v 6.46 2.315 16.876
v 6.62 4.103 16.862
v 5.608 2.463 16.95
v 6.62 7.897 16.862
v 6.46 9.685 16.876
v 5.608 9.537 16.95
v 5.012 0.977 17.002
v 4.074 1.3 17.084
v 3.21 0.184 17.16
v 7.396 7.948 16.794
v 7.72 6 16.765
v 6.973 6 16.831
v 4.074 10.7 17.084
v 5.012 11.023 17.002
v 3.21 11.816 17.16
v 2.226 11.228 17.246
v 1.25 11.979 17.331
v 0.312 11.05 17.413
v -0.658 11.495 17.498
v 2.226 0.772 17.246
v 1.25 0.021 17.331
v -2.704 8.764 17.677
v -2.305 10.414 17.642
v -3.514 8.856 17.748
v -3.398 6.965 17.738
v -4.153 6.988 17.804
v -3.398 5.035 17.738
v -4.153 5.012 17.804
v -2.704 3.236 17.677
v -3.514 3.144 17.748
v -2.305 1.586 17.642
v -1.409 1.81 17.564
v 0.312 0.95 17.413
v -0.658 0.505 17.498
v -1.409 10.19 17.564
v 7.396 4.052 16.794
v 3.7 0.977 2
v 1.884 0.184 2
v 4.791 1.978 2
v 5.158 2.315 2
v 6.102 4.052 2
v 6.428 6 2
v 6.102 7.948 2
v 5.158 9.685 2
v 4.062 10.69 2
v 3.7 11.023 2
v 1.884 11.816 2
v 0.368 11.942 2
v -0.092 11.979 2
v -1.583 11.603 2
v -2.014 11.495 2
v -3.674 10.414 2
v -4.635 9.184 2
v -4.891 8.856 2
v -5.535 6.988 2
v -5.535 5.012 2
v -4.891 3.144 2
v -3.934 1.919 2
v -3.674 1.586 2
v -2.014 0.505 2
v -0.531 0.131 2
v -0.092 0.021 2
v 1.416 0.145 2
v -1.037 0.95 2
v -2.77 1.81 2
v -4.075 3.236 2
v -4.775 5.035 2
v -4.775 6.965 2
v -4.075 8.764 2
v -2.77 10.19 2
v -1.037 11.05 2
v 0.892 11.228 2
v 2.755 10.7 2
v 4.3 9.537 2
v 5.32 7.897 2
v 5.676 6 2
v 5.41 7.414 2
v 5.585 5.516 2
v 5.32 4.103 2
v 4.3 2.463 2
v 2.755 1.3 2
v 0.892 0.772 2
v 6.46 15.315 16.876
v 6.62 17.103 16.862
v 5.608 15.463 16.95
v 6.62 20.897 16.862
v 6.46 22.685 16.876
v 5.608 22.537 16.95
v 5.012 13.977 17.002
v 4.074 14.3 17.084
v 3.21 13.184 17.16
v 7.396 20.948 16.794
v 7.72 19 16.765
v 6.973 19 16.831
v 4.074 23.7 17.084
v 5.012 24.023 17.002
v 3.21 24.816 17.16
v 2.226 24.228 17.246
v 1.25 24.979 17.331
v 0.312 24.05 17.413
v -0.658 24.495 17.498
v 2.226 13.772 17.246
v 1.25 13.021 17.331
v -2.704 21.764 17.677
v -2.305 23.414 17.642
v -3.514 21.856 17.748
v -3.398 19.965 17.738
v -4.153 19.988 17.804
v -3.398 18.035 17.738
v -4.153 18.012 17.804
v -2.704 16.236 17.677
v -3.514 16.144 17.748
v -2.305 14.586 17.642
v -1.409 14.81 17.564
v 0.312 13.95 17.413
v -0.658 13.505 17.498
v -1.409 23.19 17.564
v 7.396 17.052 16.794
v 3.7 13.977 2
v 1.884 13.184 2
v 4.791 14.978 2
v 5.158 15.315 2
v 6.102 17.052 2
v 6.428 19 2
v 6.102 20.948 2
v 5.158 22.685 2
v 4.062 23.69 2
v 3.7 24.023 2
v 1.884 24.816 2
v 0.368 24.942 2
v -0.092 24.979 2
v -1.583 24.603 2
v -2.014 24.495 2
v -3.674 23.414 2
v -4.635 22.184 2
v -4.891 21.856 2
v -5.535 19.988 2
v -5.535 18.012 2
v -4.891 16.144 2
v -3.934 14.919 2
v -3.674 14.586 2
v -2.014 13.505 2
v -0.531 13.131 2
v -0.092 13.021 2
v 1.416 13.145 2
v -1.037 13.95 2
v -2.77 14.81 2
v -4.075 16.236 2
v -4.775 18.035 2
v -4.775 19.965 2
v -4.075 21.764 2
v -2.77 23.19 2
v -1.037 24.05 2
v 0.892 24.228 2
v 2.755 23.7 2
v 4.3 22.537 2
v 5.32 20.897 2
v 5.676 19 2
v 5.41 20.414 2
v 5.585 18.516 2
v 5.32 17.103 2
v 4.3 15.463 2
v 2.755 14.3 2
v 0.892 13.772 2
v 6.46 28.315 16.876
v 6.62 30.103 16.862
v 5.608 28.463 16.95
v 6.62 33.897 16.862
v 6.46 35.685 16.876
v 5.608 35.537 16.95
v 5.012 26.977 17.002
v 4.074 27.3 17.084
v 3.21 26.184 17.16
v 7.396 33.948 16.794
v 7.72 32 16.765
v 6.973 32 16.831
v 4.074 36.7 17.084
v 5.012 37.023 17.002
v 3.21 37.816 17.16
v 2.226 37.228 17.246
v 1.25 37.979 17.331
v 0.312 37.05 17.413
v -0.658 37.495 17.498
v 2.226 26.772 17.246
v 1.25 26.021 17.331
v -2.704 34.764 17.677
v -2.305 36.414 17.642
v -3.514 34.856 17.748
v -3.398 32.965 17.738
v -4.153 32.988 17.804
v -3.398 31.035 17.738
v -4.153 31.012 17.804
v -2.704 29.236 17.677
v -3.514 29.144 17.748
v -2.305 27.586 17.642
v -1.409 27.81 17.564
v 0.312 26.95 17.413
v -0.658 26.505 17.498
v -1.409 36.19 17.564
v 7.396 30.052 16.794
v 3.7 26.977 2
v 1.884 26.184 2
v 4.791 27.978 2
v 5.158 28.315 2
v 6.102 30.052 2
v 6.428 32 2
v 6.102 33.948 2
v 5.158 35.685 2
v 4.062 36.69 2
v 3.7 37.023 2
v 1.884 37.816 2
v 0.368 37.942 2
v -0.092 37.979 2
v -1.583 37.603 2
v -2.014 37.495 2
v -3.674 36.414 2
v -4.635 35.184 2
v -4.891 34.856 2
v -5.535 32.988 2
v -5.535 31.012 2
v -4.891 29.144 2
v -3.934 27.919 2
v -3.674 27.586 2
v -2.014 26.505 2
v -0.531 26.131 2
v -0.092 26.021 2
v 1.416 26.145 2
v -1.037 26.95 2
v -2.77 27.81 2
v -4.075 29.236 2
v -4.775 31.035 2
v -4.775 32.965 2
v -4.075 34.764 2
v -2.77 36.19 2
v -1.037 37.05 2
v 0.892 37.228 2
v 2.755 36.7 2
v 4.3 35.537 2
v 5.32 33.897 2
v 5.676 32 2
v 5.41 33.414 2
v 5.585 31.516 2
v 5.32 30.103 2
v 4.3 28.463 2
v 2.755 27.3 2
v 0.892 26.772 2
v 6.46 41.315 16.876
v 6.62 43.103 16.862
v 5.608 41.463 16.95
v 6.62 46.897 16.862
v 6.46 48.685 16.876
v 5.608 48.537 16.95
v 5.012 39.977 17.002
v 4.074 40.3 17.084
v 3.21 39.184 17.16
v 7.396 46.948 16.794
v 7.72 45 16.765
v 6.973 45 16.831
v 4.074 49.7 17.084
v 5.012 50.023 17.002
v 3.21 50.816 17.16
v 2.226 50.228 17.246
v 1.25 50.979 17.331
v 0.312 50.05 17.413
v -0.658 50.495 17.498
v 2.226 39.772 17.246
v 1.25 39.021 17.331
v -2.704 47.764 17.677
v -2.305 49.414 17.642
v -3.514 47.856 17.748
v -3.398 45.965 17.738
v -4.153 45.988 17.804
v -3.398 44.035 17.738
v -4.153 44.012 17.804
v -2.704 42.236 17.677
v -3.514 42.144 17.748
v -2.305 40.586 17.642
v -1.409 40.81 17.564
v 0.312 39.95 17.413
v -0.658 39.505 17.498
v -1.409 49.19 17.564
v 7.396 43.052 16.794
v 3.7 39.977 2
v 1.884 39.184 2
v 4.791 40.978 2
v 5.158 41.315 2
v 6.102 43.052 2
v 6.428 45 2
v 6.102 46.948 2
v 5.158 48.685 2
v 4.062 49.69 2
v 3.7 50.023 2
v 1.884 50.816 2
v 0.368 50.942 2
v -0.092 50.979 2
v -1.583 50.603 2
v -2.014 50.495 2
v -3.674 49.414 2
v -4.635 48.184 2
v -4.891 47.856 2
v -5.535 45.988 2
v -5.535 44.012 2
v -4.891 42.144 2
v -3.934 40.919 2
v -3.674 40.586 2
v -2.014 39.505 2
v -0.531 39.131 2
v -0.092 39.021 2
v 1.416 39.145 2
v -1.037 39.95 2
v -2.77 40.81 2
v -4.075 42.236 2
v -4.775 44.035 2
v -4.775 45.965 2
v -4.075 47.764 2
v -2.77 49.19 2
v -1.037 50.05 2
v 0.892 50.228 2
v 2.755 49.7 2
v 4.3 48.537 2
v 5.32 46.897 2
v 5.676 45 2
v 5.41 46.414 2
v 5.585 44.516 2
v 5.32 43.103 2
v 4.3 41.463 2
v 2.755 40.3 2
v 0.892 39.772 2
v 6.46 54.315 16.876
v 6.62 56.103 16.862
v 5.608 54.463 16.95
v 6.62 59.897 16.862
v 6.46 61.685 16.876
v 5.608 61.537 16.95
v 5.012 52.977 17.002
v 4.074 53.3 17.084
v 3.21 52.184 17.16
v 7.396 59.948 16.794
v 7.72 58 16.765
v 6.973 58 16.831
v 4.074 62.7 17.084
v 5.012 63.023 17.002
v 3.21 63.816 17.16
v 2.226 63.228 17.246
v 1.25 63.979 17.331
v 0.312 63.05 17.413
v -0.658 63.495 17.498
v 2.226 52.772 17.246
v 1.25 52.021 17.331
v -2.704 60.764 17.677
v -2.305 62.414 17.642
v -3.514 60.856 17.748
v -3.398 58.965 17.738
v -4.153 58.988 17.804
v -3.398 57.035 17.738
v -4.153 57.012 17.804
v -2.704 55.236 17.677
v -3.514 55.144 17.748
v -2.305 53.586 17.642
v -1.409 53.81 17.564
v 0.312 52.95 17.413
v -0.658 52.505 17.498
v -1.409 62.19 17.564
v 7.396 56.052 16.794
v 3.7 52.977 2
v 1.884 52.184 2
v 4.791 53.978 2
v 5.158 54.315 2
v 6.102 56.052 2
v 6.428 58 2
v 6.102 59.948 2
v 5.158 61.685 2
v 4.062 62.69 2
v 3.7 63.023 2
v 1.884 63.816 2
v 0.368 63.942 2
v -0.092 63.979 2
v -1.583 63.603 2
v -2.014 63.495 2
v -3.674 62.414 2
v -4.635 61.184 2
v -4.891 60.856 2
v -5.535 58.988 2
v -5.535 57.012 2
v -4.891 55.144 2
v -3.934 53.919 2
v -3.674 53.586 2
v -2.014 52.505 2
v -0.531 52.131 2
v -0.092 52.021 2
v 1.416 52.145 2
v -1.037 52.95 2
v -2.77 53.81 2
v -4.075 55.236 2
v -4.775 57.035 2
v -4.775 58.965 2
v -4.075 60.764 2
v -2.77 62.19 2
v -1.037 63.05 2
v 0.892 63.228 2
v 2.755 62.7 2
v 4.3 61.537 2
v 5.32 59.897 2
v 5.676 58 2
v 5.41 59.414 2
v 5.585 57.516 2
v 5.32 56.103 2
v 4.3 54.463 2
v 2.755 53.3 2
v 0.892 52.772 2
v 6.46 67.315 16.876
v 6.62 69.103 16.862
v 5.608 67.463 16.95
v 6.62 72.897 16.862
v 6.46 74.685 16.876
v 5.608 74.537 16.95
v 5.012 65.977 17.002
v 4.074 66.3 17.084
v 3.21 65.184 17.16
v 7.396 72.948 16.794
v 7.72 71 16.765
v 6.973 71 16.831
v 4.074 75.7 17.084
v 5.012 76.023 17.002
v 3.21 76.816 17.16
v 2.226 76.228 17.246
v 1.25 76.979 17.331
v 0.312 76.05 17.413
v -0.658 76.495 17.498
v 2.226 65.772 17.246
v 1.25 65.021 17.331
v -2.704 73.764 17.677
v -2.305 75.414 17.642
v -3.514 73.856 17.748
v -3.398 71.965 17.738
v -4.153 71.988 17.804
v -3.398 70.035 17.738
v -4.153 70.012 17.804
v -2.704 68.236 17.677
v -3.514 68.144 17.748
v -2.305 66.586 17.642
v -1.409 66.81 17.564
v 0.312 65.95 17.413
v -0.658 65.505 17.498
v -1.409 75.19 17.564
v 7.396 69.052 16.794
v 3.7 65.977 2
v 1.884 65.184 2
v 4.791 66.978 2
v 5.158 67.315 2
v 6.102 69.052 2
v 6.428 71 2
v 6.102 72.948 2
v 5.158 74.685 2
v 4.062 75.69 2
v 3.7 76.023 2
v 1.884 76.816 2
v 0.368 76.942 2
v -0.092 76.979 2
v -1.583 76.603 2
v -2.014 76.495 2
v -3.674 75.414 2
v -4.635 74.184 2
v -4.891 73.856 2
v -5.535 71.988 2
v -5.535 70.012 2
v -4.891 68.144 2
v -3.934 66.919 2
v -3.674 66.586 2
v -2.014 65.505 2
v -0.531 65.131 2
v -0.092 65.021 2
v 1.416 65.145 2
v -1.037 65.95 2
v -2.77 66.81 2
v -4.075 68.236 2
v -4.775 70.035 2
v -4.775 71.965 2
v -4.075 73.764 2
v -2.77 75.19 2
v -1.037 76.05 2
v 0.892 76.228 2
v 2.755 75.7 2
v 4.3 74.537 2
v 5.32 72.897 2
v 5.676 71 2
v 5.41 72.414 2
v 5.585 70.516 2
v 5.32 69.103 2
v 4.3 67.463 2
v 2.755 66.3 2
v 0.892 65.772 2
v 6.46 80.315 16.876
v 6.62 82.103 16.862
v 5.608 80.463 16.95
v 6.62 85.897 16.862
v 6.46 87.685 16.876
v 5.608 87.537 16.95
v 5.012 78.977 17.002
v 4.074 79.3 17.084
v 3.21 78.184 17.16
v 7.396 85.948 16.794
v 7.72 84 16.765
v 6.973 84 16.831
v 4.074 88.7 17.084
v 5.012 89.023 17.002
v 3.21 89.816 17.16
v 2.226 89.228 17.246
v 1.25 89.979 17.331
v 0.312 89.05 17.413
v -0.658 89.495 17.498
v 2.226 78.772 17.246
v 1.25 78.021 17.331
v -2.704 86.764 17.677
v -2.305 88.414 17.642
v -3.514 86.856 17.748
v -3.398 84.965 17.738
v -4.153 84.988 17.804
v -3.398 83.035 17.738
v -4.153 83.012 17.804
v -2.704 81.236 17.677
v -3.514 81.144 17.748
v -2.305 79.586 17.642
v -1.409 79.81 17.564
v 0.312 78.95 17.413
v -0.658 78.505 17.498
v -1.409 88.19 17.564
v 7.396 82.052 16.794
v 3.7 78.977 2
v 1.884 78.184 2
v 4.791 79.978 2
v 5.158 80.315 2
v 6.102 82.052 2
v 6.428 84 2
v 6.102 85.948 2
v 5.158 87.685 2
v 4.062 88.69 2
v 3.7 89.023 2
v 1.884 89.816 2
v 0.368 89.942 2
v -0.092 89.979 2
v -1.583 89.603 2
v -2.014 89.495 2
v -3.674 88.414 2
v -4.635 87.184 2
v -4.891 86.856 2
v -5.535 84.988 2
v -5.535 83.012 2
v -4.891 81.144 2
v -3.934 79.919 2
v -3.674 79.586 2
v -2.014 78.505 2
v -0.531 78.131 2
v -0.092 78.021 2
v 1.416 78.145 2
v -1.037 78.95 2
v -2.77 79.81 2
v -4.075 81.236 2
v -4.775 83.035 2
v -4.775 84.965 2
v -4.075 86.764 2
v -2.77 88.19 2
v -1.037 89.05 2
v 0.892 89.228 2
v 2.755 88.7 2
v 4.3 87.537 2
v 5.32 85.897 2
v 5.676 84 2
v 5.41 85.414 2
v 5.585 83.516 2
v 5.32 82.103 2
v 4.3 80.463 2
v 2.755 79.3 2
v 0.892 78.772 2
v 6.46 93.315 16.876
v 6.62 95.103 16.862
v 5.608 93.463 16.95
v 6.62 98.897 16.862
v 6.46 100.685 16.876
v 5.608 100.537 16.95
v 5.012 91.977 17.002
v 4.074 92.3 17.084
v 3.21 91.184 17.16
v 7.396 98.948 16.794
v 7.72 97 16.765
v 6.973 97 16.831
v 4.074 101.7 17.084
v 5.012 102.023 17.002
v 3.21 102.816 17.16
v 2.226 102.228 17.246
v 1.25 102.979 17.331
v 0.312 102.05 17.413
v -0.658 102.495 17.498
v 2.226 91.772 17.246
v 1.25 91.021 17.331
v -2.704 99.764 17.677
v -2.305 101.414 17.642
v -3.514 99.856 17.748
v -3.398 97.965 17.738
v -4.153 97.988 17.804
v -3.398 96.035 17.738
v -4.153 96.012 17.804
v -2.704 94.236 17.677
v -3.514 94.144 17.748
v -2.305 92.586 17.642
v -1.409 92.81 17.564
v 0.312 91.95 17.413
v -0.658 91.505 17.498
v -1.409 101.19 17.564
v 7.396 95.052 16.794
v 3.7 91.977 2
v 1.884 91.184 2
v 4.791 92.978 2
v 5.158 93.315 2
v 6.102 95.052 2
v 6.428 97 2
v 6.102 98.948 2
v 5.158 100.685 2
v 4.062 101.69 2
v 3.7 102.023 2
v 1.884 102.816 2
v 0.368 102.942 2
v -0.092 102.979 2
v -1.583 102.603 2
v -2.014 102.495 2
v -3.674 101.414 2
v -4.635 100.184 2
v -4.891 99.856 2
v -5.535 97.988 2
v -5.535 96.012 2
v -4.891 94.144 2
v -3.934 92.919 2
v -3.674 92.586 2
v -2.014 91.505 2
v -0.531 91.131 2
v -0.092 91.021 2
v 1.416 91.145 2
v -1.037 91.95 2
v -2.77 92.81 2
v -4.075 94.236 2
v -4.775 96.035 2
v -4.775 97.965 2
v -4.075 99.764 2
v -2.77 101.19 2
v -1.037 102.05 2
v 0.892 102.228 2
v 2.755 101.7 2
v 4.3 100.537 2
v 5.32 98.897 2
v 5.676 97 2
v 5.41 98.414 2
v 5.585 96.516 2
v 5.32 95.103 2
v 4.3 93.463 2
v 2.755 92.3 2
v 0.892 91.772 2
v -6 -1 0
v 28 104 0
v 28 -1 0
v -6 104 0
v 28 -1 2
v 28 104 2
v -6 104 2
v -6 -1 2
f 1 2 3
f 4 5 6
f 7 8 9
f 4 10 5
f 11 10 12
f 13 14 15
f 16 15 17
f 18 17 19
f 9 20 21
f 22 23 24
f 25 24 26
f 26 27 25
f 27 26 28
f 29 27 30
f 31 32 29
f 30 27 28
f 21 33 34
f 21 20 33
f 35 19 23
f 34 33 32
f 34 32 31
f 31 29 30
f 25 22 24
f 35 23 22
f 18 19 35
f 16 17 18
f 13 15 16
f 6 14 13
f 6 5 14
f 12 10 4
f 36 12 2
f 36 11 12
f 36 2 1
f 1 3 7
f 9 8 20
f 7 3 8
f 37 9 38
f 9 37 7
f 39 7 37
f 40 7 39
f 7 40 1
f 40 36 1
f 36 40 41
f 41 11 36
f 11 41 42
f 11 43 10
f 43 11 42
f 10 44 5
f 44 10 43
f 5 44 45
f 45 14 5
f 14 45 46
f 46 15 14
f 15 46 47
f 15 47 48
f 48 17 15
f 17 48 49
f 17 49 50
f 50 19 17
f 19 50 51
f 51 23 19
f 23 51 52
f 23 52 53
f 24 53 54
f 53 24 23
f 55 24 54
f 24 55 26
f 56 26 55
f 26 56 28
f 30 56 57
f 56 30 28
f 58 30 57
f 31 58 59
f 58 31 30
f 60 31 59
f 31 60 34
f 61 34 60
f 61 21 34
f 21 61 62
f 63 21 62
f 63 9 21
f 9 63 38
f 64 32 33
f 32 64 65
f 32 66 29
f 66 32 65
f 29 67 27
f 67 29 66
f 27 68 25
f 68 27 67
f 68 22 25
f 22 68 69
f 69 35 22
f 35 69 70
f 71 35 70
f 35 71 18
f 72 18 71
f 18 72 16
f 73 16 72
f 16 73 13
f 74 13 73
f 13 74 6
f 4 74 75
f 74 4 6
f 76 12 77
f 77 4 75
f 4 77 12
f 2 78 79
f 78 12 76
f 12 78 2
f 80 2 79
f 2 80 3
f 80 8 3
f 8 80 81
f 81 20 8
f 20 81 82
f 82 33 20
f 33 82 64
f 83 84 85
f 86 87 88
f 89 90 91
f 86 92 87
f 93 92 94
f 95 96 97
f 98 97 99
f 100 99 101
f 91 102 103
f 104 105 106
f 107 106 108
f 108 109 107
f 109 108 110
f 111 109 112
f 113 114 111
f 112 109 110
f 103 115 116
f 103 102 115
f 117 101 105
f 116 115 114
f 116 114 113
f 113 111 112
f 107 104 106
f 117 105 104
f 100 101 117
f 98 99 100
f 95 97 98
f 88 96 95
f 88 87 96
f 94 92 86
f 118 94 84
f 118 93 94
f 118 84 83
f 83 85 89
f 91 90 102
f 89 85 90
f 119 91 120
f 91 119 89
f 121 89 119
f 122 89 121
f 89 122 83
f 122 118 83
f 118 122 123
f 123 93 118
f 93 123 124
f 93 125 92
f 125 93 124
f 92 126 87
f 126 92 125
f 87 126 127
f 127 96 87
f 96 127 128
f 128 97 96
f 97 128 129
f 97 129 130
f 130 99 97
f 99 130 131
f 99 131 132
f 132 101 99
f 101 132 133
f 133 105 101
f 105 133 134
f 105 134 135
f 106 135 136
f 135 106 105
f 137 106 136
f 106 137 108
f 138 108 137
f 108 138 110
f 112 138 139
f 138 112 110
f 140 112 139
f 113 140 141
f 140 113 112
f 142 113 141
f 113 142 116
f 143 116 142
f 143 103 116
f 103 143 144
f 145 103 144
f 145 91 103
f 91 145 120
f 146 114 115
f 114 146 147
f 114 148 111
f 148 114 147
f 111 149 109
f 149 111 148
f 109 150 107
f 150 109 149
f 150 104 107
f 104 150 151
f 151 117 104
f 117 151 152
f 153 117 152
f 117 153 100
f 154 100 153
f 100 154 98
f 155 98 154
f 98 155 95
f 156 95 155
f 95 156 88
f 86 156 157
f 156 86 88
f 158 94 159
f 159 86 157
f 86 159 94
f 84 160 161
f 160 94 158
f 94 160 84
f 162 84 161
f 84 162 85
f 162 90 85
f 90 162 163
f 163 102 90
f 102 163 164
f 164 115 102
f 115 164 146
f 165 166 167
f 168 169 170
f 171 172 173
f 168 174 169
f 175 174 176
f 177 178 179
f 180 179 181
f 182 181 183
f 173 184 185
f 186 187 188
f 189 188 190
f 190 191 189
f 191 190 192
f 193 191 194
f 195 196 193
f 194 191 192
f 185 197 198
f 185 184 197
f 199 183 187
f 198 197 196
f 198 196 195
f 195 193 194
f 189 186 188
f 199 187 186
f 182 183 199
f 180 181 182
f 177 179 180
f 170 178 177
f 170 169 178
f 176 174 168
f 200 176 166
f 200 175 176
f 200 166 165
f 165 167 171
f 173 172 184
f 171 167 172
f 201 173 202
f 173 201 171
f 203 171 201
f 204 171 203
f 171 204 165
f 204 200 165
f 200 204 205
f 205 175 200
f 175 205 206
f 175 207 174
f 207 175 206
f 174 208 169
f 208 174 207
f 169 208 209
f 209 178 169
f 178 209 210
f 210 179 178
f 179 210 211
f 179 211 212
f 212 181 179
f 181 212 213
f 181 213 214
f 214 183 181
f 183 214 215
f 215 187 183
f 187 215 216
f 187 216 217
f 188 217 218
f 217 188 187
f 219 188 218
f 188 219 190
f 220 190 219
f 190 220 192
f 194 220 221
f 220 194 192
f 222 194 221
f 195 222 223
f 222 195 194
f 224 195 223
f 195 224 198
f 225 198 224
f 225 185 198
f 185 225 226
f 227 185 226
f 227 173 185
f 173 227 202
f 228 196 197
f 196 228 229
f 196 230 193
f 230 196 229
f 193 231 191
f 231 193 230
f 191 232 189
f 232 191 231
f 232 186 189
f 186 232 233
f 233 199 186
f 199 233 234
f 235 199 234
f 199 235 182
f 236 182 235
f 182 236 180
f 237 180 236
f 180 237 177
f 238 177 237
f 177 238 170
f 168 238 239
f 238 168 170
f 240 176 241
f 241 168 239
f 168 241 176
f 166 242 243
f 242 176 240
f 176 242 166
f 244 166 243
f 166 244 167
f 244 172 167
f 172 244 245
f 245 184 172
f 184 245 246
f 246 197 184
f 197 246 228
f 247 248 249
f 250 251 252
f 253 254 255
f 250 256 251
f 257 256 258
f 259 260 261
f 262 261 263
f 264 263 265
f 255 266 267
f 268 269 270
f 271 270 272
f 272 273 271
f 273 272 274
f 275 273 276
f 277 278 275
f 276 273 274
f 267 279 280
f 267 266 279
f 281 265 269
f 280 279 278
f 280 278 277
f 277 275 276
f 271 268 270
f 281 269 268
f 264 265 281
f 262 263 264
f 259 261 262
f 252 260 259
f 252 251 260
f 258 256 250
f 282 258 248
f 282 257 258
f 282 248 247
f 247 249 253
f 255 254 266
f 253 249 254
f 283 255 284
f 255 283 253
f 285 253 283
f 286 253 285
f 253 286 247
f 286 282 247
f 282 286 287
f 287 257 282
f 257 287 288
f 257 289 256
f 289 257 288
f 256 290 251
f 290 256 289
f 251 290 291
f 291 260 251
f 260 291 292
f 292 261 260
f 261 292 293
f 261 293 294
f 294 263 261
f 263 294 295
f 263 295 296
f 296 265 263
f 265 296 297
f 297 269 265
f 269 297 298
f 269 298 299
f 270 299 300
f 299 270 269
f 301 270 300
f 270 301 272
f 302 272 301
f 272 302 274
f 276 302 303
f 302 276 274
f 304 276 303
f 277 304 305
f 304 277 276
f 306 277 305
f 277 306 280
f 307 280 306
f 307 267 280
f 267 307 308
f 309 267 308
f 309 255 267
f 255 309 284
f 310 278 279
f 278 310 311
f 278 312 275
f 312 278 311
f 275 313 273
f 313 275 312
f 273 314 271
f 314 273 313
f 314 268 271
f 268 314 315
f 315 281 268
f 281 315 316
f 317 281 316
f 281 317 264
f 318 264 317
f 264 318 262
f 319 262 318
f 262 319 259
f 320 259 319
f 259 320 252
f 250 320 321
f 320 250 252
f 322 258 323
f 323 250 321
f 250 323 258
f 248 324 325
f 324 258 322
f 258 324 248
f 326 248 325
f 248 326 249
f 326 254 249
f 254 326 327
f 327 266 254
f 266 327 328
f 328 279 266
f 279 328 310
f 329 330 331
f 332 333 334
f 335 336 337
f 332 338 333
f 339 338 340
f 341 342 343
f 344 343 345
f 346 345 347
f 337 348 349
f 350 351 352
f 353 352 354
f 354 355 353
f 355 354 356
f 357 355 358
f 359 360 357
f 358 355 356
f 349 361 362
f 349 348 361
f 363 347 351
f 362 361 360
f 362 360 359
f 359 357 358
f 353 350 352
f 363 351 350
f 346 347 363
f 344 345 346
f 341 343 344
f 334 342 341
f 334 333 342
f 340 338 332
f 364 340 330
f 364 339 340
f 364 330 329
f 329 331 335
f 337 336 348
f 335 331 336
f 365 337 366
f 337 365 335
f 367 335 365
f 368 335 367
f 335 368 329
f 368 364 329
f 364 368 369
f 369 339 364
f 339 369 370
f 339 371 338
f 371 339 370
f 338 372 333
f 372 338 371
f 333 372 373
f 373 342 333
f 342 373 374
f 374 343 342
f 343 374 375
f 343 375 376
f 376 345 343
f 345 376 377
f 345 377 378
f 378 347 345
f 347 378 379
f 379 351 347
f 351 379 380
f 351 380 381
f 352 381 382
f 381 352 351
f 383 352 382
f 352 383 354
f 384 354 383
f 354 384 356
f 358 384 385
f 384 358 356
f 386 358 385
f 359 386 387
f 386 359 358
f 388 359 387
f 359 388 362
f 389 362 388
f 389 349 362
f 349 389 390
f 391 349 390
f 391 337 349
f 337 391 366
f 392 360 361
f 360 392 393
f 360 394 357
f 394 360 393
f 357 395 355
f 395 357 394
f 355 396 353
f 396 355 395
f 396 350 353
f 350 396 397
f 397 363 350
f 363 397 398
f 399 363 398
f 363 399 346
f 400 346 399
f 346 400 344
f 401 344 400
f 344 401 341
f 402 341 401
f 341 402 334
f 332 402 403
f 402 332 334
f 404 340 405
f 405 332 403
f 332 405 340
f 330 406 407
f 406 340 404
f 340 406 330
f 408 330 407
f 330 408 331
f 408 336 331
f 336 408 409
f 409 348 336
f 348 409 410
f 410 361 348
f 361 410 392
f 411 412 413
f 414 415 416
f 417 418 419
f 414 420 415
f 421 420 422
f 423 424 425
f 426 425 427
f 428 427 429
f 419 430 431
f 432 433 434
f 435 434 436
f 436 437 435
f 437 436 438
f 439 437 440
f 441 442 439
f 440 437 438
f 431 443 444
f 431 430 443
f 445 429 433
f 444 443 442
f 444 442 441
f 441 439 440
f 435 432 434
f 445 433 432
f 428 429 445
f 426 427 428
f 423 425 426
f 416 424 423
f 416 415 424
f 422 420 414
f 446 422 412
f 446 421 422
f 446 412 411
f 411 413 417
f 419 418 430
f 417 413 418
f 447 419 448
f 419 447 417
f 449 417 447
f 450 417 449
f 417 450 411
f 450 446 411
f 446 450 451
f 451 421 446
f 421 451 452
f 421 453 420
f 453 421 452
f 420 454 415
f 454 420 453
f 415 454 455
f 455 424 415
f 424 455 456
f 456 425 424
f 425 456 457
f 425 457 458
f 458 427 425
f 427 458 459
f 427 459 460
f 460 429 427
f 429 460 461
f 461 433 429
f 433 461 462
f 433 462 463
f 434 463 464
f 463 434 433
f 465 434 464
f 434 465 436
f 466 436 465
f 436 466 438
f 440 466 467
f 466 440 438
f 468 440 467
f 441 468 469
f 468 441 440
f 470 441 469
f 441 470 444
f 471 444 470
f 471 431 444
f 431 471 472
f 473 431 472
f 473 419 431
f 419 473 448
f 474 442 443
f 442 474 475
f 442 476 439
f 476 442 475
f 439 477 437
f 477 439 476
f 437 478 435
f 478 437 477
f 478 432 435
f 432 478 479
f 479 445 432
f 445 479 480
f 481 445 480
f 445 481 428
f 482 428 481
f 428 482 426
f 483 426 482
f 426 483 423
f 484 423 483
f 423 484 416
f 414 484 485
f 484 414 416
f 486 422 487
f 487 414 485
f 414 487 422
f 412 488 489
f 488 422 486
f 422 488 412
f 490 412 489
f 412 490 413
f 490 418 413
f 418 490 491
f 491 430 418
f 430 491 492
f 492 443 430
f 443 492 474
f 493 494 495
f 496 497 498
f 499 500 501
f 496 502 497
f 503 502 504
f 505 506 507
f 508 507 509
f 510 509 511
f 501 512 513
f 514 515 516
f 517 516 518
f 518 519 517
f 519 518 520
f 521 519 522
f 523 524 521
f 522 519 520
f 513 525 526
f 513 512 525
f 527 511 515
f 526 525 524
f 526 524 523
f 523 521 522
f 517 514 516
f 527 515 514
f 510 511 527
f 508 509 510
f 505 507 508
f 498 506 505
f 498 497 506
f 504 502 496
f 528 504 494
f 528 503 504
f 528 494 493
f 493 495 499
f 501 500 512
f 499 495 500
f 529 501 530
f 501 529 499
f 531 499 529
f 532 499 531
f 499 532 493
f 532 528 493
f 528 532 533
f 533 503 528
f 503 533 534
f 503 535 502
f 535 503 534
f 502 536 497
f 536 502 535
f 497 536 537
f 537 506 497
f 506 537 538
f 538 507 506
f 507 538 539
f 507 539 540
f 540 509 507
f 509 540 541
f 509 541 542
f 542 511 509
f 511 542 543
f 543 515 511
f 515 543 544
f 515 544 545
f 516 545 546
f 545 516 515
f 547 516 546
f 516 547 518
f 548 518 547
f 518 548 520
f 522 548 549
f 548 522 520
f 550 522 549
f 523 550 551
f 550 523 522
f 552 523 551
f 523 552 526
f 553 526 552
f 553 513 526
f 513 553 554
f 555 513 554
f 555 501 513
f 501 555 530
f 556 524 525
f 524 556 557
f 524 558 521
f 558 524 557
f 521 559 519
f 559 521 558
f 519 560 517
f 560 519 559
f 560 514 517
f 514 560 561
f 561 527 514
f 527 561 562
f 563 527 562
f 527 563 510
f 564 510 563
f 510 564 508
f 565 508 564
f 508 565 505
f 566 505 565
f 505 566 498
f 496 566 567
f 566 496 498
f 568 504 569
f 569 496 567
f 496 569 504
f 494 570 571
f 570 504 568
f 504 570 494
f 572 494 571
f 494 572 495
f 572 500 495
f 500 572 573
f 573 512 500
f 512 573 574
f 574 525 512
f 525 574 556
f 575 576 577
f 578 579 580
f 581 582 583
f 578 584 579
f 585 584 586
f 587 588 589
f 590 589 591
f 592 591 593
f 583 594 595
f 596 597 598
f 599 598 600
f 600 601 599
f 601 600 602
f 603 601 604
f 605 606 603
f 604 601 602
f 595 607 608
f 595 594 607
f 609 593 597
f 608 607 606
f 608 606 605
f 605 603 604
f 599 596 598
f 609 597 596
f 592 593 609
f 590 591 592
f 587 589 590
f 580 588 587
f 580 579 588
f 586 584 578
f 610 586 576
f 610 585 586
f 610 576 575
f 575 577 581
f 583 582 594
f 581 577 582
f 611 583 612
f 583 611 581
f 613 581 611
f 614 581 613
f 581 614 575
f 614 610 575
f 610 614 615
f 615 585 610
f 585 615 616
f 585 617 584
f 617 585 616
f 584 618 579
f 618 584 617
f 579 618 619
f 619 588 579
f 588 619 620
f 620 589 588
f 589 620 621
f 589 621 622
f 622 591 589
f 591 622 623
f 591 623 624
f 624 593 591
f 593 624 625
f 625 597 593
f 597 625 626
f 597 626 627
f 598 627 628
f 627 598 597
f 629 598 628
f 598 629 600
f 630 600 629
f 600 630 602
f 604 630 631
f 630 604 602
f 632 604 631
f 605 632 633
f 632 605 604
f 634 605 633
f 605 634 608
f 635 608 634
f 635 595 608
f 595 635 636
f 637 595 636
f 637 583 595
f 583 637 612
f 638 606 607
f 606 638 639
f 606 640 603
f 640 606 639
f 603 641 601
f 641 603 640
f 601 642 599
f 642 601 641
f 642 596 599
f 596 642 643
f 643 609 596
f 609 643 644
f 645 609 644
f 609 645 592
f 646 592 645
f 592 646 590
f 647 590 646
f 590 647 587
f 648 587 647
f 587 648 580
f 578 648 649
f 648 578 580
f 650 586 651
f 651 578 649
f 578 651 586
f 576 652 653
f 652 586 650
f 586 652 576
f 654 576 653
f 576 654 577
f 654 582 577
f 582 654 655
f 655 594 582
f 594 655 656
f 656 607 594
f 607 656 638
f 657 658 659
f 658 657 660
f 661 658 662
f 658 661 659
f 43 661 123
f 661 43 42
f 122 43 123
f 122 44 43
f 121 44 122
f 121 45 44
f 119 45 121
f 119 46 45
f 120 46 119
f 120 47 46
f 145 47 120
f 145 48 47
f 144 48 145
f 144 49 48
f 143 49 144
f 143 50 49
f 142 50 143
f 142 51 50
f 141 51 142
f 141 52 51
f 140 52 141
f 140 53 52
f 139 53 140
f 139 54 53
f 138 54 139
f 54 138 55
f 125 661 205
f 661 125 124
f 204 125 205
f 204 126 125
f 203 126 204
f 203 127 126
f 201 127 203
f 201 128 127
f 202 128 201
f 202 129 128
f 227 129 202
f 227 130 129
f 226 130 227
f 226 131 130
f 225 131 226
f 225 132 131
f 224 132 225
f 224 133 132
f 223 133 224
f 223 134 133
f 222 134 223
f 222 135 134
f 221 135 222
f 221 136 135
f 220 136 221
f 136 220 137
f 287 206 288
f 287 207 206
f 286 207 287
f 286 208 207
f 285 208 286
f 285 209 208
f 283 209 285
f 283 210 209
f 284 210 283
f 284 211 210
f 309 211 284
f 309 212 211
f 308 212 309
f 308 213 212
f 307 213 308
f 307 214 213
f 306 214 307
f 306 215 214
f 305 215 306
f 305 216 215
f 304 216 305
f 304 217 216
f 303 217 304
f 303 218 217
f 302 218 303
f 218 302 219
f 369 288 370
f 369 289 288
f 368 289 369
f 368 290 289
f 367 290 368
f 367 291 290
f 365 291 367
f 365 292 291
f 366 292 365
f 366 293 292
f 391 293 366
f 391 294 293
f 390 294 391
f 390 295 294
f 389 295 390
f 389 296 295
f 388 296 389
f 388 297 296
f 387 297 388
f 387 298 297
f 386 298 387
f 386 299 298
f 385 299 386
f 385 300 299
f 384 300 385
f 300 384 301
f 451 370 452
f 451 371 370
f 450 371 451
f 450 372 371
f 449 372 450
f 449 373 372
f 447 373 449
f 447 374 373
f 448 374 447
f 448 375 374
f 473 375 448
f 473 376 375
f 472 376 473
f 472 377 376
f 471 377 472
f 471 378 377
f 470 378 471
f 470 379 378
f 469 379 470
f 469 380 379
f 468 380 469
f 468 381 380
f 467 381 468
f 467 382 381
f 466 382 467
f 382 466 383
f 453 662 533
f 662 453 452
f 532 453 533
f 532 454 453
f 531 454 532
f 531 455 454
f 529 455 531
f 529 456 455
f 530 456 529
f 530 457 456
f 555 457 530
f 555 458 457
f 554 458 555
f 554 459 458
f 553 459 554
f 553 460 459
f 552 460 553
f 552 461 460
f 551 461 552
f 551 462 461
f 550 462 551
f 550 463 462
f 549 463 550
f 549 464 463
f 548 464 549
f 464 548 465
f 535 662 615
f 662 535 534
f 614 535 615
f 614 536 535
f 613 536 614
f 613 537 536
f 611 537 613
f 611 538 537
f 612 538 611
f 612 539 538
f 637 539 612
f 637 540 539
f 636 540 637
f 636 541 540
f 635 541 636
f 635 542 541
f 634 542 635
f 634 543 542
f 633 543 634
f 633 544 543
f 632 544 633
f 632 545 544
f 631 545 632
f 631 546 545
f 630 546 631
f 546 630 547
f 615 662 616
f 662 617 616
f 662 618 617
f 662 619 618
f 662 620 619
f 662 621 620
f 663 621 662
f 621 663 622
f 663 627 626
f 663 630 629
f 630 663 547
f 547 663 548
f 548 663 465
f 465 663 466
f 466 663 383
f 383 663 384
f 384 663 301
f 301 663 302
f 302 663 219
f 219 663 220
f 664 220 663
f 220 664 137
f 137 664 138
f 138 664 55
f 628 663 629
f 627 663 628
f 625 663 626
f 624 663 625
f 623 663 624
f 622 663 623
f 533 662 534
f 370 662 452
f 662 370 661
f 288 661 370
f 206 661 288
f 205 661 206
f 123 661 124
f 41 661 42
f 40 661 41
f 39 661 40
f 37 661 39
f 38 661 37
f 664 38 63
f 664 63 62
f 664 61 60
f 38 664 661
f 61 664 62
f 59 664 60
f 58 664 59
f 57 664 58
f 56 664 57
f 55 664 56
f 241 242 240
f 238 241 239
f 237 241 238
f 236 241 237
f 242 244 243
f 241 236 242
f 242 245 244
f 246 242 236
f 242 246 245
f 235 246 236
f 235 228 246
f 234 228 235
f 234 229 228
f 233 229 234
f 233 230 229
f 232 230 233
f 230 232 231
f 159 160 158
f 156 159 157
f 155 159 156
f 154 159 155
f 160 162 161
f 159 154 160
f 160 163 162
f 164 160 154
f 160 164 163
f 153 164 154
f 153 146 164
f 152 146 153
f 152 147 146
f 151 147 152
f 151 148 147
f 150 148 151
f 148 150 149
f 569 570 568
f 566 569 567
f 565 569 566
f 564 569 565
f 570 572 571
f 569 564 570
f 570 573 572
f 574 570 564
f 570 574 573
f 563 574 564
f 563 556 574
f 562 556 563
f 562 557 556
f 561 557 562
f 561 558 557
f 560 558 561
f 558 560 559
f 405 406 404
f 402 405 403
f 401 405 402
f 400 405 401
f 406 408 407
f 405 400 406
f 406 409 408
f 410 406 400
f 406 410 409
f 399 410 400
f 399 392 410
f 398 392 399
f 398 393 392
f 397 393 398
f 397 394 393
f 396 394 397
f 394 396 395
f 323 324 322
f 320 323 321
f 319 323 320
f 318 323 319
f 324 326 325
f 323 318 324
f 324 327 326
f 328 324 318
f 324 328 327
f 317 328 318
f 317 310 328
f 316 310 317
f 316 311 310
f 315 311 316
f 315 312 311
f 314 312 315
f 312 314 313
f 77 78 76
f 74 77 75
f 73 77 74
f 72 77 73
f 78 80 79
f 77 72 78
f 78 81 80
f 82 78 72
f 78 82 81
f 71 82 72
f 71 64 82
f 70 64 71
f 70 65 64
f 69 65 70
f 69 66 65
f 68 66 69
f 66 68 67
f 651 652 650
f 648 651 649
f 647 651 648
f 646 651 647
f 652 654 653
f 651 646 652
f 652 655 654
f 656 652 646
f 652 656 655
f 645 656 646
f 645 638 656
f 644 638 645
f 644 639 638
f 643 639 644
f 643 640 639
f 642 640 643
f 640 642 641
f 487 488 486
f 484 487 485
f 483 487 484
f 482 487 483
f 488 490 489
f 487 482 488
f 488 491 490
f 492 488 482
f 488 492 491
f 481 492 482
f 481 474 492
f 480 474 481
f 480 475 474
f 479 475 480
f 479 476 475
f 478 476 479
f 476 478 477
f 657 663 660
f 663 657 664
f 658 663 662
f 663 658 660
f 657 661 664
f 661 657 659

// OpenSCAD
/*
    
 ______                                                
/\  _  \                                               
\ \ \L\ \                                              
 \ \  __ \                                             
  \ \ \/\ \                                            
   \ \_\ \_\                                           
    \/_/\/_/                                           
                                                       
                                                       
 ____        __                   __                   
/\  _`\   __/\ \__               /\ \                  
\ \ \L\ \/\_\ \ ,_\    __    ____\ \ \___              
 \ \ ,  /\/\ \ \ \/  /'__`\ /',__\\ \  _ `\            
  \ \ \\ \\ \ \ \ \_/\  __//\__, `\\ \ \ \ \           
   \ \_\ \_\ \_\ \__\ \____\/\____/ \ \_\ \_\          
    \/_/\/ /\/_/\/__/\/____/\/___/   \/_/\/_/          
                                                       
                                                       
 __  __   __                                           
/\ \/\ \ /\ \                                          
\ \ \/'/'\ \ \___      __      ___     ___      __     
 \ \ , <  \ \  _ `\  /'__`\  /' _ `\ /' _ `\  /'__`\   
  \ \ \\`\ \ \ \ \ \/\ \L\.\_/\ \/\ \/\ \/\ \/\ \L\.\_ 
   \ \_\ \_\\ \_\ \_\ \__/.\_\ \_\ \_\ \_\ \_\ \__/.\_\
    \/_/\/_/ \/_/\/_/\/__/\/_/\/_/\/_/\/_/\/_/\/__/\/_/
                                                       
                                                       
 ____                                                  
/\  _`\                  __                            
\ \ \/\ \     __    ____/\_\     __     ___            
 \ \ \ \ \  /'__`\ /',__\/\ \  /'_ `\ /' _ `\          
  \ \ \_\ \/\  __//\__, `\ \ \/\ \L\ \/\ \/\ \         
   \ \____/\ \____\/\____/\ \_\ \____ \ \_\ \_\        
    \/___/  \/____/\/___/  \/_/\/___L\ \/_/\/_/        
                                 /\____/               
                                 \_/__/                

Ritesh Khanna - ritesh@gmail.com

Please enjoy, revise and share this sharpie marker holder freely.
I always appriciate it when credit is given back to me!

*/

holeCount = 8;          //Number of sharpies to hold.
holeDiameter=12;        //Diameter INCLUDING wall thickness of each hole.
holeWallThickness = 1.5;//Wall Thickness of the holes
holeHeight = 20;        //Height of each hole
holeGap = 1;            //Distance between each hole
angle=5;                //Angle of each hole
baseHeight = 2;         //Thickness of base.


//Logic, no need to edit below this line.
difference()
{
    holes();
    translate([0,0,-holeHeight])
    {
        base(holeHeight,18);
    }
}
translate([2,0,0])


base(baseHeight,18);

module base(height, addedDepth)
{
    length = (holeDiameter + holeGap) * holeCount + holeGap;
translate([ -( holeDiameter / 2 + holeGap * 2) ,-holeGap,0])
{
    cube( [holeDiameter + holeGap * 4 + addedDepth,length,height]);
};

}

module holes()
{
    for (i = [0:holeCount-1])
    {
        translate([0,i * (holeDiameter + holeGap) + holeDiameter *0.5, -(sin(25) * (holeDiameter/2) ) -0.1 ])
        {
            rotate([0,angle,0])
            {
                linear_extrude(holeHeight)
                {
                    difference()
                    {
                        circle(d=holeDiameter);
                        circle(d=(holeDiameter-holeWallThickness));
                    }
                }
            }
        }
    }
}
